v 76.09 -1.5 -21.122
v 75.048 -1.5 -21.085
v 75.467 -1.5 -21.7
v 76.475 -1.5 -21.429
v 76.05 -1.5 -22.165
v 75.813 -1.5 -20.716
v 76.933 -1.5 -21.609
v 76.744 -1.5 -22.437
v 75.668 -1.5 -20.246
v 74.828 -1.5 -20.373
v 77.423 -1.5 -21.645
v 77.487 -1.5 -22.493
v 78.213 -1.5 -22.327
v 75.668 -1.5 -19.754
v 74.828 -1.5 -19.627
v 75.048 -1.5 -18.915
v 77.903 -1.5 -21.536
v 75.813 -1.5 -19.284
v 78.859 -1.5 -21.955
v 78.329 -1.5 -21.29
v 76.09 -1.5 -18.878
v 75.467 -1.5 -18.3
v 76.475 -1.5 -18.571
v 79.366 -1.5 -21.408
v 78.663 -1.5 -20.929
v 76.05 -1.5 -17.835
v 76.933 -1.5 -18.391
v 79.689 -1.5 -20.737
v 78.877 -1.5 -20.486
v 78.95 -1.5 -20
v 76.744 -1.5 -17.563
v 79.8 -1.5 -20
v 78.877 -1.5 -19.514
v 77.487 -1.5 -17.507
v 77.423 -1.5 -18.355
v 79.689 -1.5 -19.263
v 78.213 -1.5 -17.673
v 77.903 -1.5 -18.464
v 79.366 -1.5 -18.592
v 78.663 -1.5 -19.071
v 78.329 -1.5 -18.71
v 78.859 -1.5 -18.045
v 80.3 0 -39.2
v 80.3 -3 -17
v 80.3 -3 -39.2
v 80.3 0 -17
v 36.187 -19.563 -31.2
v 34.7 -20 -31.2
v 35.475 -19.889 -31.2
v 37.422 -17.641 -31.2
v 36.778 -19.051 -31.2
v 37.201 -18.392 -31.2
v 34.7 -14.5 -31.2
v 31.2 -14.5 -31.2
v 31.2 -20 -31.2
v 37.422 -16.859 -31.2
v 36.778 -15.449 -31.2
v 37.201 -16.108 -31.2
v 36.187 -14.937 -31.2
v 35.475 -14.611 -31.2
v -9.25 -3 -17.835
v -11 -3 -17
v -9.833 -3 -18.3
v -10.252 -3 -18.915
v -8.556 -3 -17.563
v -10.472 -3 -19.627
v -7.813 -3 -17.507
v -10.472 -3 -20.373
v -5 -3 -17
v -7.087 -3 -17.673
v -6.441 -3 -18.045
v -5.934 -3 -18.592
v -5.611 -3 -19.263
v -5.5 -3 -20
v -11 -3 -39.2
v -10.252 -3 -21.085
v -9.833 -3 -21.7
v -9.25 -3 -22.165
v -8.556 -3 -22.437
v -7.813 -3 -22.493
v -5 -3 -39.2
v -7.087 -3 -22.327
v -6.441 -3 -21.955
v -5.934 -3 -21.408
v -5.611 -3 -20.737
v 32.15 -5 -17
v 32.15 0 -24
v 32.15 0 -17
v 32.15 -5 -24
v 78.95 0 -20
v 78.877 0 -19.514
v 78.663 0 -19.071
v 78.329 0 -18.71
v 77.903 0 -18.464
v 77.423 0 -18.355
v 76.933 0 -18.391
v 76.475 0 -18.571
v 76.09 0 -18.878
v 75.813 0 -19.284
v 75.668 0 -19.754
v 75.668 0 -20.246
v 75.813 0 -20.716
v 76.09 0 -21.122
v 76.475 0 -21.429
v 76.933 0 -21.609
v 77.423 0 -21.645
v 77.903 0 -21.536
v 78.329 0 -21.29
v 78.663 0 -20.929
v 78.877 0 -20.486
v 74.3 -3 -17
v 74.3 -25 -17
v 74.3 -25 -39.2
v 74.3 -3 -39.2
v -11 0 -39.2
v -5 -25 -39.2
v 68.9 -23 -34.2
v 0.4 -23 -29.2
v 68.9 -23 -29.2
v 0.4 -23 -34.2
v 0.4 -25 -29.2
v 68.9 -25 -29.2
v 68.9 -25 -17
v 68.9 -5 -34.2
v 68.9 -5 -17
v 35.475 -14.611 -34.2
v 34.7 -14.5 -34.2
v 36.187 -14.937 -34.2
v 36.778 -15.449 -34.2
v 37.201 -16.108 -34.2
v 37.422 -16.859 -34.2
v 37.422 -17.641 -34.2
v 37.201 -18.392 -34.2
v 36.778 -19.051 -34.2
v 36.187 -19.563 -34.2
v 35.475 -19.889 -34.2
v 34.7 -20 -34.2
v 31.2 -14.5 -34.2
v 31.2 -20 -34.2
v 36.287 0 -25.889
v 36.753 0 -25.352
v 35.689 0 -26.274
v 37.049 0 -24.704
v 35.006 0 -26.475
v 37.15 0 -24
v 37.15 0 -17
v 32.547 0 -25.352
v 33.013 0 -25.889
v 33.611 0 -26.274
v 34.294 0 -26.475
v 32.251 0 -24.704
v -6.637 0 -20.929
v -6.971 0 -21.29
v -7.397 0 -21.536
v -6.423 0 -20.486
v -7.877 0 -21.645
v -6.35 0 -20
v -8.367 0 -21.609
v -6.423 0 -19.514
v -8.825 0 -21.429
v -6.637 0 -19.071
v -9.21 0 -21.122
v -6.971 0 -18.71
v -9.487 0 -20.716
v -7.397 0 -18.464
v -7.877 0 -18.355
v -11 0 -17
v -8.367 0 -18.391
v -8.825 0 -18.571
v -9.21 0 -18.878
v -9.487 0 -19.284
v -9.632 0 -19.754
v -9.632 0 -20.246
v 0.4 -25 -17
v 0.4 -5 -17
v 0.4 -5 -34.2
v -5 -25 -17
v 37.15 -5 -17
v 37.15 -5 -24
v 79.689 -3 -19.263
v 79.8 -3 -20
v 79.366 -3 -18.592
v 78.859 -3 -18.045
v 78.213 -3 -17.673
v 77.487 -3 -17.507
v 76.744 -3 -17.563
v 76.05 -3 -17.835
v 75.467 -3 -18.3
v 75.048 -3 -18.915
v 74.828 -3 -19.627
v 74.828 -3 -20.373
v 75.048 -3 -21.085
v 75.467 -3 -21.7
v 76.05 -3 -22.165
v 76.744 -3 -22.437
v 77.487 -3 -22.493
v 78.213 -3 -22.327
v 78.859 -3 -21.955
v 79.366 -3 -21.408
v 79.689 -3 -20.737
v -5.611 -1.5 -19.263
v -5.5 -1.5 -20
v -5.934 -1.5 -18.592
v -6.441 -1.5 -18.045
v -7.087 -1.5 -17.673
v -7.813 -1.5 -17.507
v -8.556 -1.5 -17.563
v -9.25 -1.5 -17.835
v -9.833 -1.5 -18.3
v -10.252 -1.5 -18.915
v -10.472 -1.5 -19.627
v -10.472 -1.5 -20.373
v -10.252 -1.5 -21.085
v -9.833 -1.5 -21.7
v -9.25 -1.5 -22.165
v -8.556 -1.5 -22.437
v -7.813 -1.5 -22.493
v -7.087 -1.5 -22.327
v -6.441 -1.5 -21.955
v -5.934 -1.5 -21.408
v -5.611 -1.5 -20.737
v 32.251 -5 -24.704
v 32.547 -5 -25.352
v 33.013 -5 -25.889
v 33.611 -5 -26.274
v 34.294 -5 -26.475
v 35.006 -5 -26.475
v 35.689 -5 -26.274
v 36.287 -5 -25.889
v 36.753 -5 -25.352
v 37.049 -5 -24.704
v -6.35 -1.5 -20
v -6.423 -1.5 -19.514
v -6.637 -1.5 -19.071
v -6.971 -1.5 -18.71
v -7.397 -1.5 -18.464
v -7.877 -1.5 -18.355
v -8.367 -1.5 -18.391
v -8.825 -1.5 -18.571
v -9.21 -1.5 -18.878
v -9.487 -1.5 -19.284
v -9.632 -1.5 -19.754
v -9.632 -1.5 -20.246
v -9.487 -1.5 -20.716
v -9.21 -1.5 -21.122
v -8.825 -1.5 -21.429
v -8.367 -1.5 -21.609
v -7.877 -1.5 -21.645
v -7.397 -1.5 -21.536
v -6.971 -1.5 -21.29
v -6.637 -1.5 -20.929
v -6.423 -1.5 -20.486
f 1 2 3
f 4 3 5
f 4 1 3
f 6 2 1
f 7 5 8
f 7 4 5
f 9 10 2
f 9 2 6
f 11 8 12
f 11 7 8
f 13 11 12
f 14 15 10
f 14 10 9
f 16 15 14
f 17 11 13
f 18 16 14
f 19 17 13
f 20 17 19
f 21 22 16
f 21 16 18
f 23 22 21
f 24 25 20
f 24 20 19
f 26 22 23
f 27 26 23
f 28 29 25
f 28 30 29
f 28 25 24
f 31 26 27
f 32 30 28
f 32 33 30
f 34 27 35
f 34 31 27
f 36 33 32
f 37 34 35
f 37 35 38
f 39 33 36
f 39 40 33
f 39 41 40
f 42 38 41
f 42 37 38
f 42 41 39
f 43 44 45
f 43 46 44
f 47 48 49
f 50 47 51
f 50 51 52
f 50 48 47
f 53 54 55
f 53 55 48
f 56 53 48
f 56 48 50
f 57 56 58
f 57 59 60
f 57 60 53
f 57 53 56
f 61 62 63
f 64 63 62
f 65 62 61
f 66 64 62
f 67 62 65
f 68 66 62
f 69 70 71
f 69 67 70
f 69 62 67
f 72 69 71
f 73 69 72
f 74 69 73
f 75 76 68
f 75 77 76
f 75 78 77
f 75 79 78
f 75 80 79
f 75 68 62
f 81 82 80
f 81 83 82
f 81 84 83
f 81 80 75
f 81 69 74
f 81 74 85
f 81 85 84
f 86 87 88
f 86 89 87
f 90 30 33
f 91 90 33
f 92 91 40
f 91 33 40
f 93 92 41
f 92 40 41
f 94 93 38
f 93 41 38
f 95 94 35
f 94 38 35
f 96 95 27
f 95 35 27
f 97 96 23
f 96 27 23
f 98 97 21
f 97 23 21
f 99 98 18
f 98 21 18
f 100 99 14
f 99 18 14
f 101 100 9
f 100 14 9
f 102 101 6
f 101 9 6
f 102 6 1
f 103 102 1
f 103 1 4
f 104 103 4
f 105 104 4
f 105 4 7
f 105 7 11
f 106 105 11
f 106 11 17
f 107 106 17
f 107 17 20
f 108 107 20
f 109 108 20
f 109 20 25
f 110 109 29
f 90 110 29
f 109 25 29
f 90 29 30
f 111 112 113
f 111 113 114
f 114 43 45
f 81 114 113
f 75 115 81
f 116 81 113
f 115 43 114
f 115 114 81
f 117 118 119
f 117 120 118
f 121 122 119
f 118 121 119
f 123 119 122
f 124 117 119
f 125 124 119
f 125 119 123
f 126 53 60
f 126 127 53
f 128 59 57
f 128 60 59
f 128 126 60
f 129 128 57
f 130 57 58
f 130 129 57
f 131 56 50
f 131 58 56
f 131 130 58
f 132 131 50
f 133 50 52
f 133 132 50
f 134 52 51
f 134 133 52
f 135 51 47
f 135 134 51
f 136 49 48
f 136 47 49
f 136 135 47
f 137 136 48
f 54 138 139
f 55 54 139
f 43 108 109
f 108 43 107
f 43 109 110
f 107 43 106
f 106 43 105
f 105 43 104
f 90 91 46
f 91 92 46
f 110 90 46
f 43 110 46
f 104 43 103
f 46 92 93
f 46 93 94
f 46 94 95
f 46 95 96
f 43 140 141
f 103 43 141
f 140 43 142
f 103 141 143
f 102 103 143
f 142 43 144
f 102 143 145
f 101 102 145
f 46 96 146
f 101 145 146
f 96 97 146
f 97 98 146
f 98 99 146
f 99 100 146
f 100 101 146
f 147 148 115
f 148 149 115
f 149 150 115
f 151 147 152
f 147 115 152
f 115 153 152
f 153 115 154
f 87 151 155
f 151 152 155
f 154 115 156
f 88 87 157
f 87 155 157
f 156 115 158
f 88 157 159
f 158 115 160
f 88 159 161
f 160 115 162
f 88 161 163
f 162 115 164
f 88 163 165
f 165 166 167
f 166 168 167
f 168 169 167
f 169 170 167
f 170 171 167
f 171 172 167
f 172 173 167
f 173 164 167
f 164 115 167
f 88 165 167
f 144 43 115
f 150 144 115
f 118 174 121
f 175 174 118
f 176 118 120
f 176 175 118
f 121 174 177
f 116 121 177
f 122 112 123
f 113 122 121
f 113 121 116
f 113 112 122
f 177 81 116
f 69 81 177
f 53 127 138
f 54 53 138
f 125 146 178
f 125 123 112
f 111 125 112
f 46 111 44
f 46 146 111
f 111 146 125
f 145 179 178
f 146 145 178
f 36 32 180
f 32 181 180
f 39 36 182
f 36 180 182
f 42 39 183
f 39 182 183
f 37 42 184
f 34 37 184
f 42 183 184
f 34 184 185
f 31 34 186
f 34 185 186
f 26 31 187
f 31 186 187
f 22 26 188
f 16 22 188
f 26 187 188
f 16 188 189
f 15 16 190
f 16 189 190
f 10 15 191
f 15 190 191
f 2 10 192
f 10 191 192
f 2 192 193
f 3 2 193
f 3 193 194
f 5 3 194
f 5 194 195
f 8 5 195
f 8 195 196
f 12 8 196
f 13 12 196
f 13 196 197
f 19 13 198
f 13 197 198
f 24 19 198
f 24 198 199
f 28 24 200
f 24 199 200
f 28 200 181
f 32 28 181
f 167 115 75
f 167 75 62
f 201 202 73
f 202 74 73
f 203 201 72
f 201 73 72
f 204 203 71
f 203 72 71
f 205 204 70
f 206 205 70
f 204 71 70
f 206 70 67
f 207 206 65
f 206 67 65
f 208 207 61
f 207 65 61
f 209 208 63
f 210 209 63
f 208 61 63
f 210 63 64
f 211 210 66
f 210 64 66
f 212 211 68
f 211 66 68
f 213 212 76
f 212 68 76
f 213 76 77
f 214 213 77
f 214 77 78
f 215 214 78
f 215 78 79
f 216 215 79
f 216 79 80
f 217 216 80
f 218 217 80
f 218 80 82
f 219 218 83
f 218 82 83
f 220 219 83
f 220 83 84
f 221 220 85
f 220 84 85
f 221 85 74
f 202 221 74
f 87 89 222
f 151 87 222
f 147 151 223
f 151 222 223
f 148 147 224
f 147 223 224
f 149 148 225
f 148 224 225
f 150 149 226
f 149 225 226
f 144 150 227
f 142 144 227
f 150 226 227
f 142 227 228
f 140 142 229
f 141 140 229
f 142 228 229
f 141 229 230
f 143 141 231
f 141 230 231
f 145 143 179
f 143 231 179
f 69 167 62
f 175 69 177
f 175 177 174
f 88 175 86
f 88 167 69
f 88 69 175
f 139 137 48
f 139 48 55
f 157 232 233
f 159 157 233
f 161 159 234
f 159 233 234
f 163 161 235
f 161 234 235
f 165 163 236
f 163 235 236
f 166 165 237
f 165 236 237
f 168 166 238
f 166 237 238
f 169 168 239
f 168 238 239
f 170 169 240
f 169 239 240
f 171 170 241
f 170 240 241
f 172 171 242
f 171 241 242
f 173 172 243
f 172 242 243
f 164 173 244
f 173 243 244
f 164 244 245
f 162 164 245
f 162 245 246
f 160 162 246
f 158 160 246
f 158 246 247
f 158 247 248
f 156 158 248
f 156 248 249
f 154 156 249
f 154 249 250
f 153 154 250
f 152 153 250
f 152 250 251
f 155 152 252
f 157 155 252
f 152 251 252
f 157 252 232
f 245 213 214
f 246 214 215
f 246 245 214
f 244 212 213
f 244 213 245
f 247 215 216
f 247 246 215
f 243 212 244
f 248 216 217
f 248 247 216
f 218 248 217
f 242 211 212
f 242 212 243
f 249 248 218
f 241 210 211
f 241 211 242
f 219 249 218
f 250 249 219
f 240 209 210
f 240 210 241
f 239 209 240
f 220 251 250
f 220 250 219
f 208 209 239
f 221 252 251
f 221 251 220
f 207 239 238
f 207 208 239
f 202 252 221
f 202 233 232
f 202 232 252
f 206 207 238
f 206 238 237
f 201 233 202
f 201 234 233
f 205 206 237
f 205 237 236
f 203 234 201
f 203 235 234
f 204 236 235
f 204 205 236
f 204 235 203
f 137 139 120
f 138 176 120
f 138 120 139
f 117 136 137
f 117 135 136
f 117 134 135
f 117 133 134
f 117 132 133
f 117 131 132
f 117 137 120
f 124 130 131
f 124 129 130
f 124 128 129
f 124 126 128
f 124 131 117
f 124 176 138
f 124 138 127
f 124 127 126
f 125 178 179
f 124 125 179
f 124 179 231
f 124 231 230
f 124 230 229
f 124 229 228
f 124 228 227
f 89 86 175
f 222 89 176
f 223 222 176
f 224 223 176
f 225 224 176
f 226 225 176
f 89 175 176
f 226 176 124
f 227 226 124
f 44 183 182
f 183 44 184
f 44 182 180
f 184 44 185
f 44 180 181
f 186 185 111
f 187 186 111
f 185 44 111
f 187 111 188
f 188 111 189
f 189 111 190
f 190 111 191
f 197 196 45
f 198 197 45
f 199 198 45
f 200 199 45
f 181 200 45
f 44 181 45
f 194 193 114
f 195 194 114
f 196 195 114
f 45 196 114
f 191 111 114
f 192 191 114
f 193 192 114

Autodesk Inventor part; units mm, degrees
ref_plane "YZ Plane" through (0, 0, 0) normal (1, 0, 0) x (0, 1, 0)
ref_plane "XZ Plane" through (0, 0, 0) normal (0, 1, 0) x (-1, 0, 0)
ref_plane "XY Plane" through (0, 0, 0) normal (0, 0, 1) x (1, 0, 0)
sketch "Sketch2" plane through (0, 0, 0) normal (0, 1, 0) x (-1, 0, 0)
  line L0 (0, 0) -> (0, -39.2)
  line L1 (0, -39.2) -> (-69.3, -39.2)
  line L2 (-69.3, -39.2) -> (-69.3, 0)
  line L3 (-69.3, 0) -> (0, 0)
  dimension "d0" = 39.2
  dimension "d1" = 69.3
extrude "Extrusion1" add sketch "Sketch2" against normal blind 5
sketch "Sketch3" plane through (0, -5, 0) normal (0, -1, 0) x (1, 0, 0)
  line L0 (0, 0) -> (0, -39.2) projected
  line L1 (0, -39.2) -> (0, -34.2)
  line L2 (0, -34.2) -> (69.3, -34.2)
  line L3 (69.3, -39.2) -> (69.3, 0) projected
  line L4 (69.3, -39.2) -> (69.3, -34.2)
  line L5 (0, -39.2) -> (69.3, -39.2)
  dimension "d4" = 5
extrude "Extrusion2" add sketch "Sketch3" along normal blind 20
sketch "Sketch4" plane through (0, -5, -34.2) normal (0, 0, 1) x (1, 0, 0)
  line L0 (0, 5) -> (0, -20) projected
  line L1 (0, -20) -> (0, -18)
  line L2 (0, -18) -> (69.3, -18)
  line L3 (69.3, 5) -> (69.3, -20) projected
  line L4 (69.3, -20) -> (69.3, -18)
  line L5 (0, -20) -> (69.3, -20) projected
  line L6 (0, -20) -> (69.3, -20)
  dimension "d7" = 2
extrude "Extrusion3" add sketch "Sketch4" along normal blind 5
sketch "Sketch5" plane through (69.3, 0, 0) normal (1, 0, 0) x (0, 0, -1)
  line L0 (39.2, -25) -> (29.2, -25) projected
  line L1 (29.2, -25) -> (29.2, 0)
  line L2 (39.2, 0) -> (0, 0) projected
  line L3 (29.2, 0) -> (39.2, 0)
  line L4 (39.2, 0) -> (39.2, -25)
  line L5 (39.2, -25) -> (29.2, -25)
extrude "Extrusion4" add sketch "Sketch5" along normal blind 5
sketch "Sketch6" plane through (69.3, -5, 0) normal (1, 0, 0) x (0, 0, -1)
  line L0 (0, 5) -> (0, 0) projected
  line L1 (29.2, 0) -> (29.2, 5) projected
  line L2 (0, 5) -> (29.2, 5)
  line L3 (29.2, 5) -> (29.2, 0)
  line L4 (0, 0) -> (34.2, 0) projected
  line L5 (29.2, 0) -> (0, 0)
  line L6 (0, 0) -> (0, 5)
extrude "Extrusion5" add sketch "Sketch6" along normal blind 5
sketch "Sketch7" plane through (0, -5, -29.2) normal (0, 0, 1) x (1, 0, 0)
  line L0 (0, -20) -> (74.3, -20) projected
  line L1 (74.3, -20) -> (74.3, 0)
  line L2 (74.3, 0) -> (69.3, 0) projected
  line L3 (74.3, 0) -> (69.3, 0)
  line L4 (69.3, 0) -> (69.3, -18) projected
  line L5 (69.3, 0) -> (69.3, -20)
  line L6 (74.3, -20) -> (69.3, -20)
  point P0 (0, 5)
extrude "Extrusion6" add sketch "Sketch7" along normal up to surface (29.2 mm away)
sketch "Sketch8" plane through (0, 0, -39.2) normal (-1, 0, 0) x (0, 0, 1)
  line L0 (10, -25) -> (39.2, -25) projected
  line L1 (10, -25) -> (10, 0)
  line L2 (0, 0) -> (39.2, 0) projected
  line L3 (0, 0) -> (10, 0)
  line L4 (0, 0) -> (0, -25)
  line L5 (0, -25) -> (10, -25)
extrude "Extrusion7" add sketch "Sketch8" along normal blind 5
sketch "Sketch9" plane through (0, -5, 0) normal (-1, 0, 0) x (0, 0, 1)
  line L0 (-29.2, 5) -> (0, 5) projected
  line L1 (0, 5) -> (-29.2, 5)
  line L2 (-39.2, -20) -> (-29.2, -20) projected
  line L3 (-29.2, 5) -> (-29.2, -20)
  line L4 (0, 5) -> (0, -20) projected
  line L5 (-29.2, -20) -> (0, -20)
  line L6 (0, -20) -> (0, 5)
extrude "Extrusion8" add sketch "Sketch9" along normal blind 5
sketch "Sketch10" plane through (74.3, 0, 0) normal (1, 0, 0) x (0, 0, -1)
  line L0 (0, 0) -> (0, -25) projected
  line L1 (0, 0) -> (0, -3)
  line L2 (0, -3) -> (39.2, -3)
  line L3 (39.2, 0) -> (39.2, -25) projected
  line L4 (39.2, 0) -> (0, 0) projected
  line L5 (39.2, 0) -> (0, 0)
  line L6 (39.2, -3) -> (39.2, 0)
  dimension "d20" = 3
sketch "Sketch11" plane through (-5, 0, -39.2) normal (-1, 0, 0) x (0, 0, 1)
  line L0 (39.2, 0) -> (39.2, -25) projected
  line L1 (39.2, 0) -> (39.2, -3)
  line L2 (39.2, -3) -> (0, -3)
  line L3 (0, 0) -> (0, -25) projected
  line L4 (0, 0) -> (0, -3)
  line L5 (0, 0) -> (39.2, 0)
  dimension "d21" = 3
extrude "Extrusion9" add sketch "Sketch11" along normal blind 6
extrude "Extrusion10" add sketch "Sketch10" along normal blind 6
sketch "Sketch13" plane through (0, -5, 0) normal (0, -1, 0) x (1, 0, 0)
  line L0 (0, -34.2) -> (69.3, -34.2) projected
  arc A0 (32.15, -24) -> (37.15, -24) centre (34.65, -24) ccw
  line L1 (32.15, -24) -> (32.15, 0)
  line L2 (37.15, -24) -> (37.15, 0)
  line L3 (0, 0) -> (69.3, 0) projected
  dimension "d34" = 5
  dimension "d56" = 24
  dimension "d57" = 24
extrude "Extrusion13" cut sketch "Sketch13" against normal through all
sketch "Sketch15" plane through (0, 0, -39.2) normal (1, 0, 0) x (0, 0, -1)
  line L0 (0, -25) -> (-39.2, -25) projected
  line L1 (-10, -23) -> (-10, -25) projected
  line L2 (-39.2, -25) -> (-10, -25)
  line L3 (-10, -25) -> (-10, -23)
  line L4 (-5, -5) -> (-5, -23) projected
  line L5 (-10, -23) -> (-5, -23)
  line L6 (-5, -23) -> (-5, -5)
  line L7 (-39.2, -5) -> (-5, -5) projected
  line L8 (-5, -5) -> (-39.2, -5)
  line L9 (-10, -25) -> (-39.2, -25) projected
  line L10 (-39.2, -5) -> (-39.2, -25)
  point P0 (-39.2, 0)
extrude "Extrusion15" add sketch "Sketch15" along normal blind 0.4
sketch "Sketch16" plane through (69.3, 0, 0) normal (-1, 0, 0) x (0, 0, 1)
  line L0 (-34.2, -5) -> (0, -5) projected
  line L1 (0, -5) -> (0, -25)
  line L2 (-29.2, -25) -> (-29.2, -23) projected
  line L3 (0, -25) -> (-29.2, -25)
  line L4 (-29.2, -25) -> (-29.2, -23)
  line L5 (-29.2, -23) -> (-34.2, -23)
  line L6 (-34.2, -5) -> (-34.2, -23) projected
  line L7 (-34.2, -23) -> (-34.2, -5)
  line L8 (-34.2, -5) -> (0, -5)
  point P0 (0, 0)
extrude "Extrusion16" add sketch "Sketch16" along normal blind 0.4
sketch "Sketch17" plane through (0.4, -23, -34.2) normal (0, 0, 1) x (1, 0, 0)
  line L0 (0, 0) -> (30, 0)
  line L1 (0, 0) -> (68.5, 0) projected
  line L2 (68.5, 0) -> (37.5, 0)
  line L3 (37.5, 0) -> (37.5, 3)
  line L4 (30, 0) -> (30, 3)
  line L5 (30, 3) -> (30.8, 3)
  line L6 (37.5, 3) -> (36.7, 3)
  line L7 (34.3, 8.5) -> (30.8, 8.5)
  line L8 (30.8, 8.5) -> (30.8, 3)
  line L9 (36.7, 3) -> (30.8, 3)
  arc A0 (34.3, 3) -> (34.3, 8.5) centre (34.3, 5.75) ccw
  point P0 (-0.4, 23)
  dimension "d46" = 30
  dimension "d47" = 31
  dimension "d48" = 3
  dimension "d49" = 0.8
  dimension "d50" = 0.8
  dimension "d59" = 3.5
  dimension "d60" = 3.5
  dimension "d61" = 5.5
extrude "Extrusion17" add sketch "Sketch17" along normal blind 3 contours L8 L7 A0 L9
sketch "Sketch18" plane through (-11, -3, 0) normal (0, 0, 1) x (1, 0, 0)
  line L0 (6, 0) -> (0, 0) projected
  line L1 (0, 3) -> (0, 0)
  line L2 (0, 0) -> (6, 0)
  line L3 (6, 0) -> (6, -22) projected
  line L4 (6, 0) -> (6, -22)
  line L5 (6, -22) -> (11, -22)
  line L6 (85.3, -22) -> (6, -22) projected
  line L7 (11.4, -2) -> (11.4, -22) projected
  line L8 (11.4, -2) -> (79.9, -2)
  line L9 (79.9, -20) -> (11.4, -20) projected
  line L10 (79.9, -2) -> (79.9, -22)
  line L11 (85.3, -22) -> (85.3, 0) projected
  line L12 (79.9, -22) -> (85.3, -22)
  line L13 (85.3, -22) -> (85.3, 0)
  line L14 (85.3, 0) -> (91.3, 0)
  line L15 (91.3, 0) -> (93.4951, 0)
  line L16 (85.3, 0) -> (91.3, 0) projected
  line L17 (91.3, 0) -> (91.3, 3)
  line L18 (91.3, 3) -> (0, 3)
  line L19 (11.4, -2) -> (79.9, -2) projected
  line L20 (11.4, -2) -> (11.4, -22)
  line L21 (11, -22) -> (11.4, -22)
  point P0 (11, 3)
extrude "Extrusion18" cut sketch "Sketch18" against normal blind 17 contours L0 L1 L18 L17 L14 L11 L6 L10 L8 L7 L5 L3
sketch "Sketch19" plane through (-11, -3, -39.2) normal (0, -1, 0) x (1, 0, 0)
  line L0 (0, 22.2) -> (0, 0) projected
  line L1 (0, 11.1) -> (6, 11.1)
  line L2 (6, 0) -> (6, 22.2) projected
  circle A0 centre (3, 3) radius 1.65 projected
  circle A1 centre (3, 3) radius 1.65
  circle A2 centre (3, 3) radius 2.5
  circle A3 centre (3, 19.2) radius 1.65
  circle A4 centre (3, 19.2) radius 2.5
  circle A5 centre (88.3, 3) radius 1.65 projected
  circle A6 centre (88.3, 3) radius 1.65
  circle A7 centre (88.3, 3) radius 2.5
  circle A8 centre (88.3, 19.2) radius 1.65
  circle A9 centre (88.3, 19.2) radius 2.5
  point P0 (11, 39.2)
  dimension "d64" = 5
  dimension "d65" = 5
extrude "Extrusion19" cut sketch "Sketch19" against normal through all contours A3 | A8
extrude "Extrusion20" cut sketch "Sketch19" against normal blind 1.5 contours A3 | A4 | A9
properties part number "bottomcameraholder_6_24_2021"
